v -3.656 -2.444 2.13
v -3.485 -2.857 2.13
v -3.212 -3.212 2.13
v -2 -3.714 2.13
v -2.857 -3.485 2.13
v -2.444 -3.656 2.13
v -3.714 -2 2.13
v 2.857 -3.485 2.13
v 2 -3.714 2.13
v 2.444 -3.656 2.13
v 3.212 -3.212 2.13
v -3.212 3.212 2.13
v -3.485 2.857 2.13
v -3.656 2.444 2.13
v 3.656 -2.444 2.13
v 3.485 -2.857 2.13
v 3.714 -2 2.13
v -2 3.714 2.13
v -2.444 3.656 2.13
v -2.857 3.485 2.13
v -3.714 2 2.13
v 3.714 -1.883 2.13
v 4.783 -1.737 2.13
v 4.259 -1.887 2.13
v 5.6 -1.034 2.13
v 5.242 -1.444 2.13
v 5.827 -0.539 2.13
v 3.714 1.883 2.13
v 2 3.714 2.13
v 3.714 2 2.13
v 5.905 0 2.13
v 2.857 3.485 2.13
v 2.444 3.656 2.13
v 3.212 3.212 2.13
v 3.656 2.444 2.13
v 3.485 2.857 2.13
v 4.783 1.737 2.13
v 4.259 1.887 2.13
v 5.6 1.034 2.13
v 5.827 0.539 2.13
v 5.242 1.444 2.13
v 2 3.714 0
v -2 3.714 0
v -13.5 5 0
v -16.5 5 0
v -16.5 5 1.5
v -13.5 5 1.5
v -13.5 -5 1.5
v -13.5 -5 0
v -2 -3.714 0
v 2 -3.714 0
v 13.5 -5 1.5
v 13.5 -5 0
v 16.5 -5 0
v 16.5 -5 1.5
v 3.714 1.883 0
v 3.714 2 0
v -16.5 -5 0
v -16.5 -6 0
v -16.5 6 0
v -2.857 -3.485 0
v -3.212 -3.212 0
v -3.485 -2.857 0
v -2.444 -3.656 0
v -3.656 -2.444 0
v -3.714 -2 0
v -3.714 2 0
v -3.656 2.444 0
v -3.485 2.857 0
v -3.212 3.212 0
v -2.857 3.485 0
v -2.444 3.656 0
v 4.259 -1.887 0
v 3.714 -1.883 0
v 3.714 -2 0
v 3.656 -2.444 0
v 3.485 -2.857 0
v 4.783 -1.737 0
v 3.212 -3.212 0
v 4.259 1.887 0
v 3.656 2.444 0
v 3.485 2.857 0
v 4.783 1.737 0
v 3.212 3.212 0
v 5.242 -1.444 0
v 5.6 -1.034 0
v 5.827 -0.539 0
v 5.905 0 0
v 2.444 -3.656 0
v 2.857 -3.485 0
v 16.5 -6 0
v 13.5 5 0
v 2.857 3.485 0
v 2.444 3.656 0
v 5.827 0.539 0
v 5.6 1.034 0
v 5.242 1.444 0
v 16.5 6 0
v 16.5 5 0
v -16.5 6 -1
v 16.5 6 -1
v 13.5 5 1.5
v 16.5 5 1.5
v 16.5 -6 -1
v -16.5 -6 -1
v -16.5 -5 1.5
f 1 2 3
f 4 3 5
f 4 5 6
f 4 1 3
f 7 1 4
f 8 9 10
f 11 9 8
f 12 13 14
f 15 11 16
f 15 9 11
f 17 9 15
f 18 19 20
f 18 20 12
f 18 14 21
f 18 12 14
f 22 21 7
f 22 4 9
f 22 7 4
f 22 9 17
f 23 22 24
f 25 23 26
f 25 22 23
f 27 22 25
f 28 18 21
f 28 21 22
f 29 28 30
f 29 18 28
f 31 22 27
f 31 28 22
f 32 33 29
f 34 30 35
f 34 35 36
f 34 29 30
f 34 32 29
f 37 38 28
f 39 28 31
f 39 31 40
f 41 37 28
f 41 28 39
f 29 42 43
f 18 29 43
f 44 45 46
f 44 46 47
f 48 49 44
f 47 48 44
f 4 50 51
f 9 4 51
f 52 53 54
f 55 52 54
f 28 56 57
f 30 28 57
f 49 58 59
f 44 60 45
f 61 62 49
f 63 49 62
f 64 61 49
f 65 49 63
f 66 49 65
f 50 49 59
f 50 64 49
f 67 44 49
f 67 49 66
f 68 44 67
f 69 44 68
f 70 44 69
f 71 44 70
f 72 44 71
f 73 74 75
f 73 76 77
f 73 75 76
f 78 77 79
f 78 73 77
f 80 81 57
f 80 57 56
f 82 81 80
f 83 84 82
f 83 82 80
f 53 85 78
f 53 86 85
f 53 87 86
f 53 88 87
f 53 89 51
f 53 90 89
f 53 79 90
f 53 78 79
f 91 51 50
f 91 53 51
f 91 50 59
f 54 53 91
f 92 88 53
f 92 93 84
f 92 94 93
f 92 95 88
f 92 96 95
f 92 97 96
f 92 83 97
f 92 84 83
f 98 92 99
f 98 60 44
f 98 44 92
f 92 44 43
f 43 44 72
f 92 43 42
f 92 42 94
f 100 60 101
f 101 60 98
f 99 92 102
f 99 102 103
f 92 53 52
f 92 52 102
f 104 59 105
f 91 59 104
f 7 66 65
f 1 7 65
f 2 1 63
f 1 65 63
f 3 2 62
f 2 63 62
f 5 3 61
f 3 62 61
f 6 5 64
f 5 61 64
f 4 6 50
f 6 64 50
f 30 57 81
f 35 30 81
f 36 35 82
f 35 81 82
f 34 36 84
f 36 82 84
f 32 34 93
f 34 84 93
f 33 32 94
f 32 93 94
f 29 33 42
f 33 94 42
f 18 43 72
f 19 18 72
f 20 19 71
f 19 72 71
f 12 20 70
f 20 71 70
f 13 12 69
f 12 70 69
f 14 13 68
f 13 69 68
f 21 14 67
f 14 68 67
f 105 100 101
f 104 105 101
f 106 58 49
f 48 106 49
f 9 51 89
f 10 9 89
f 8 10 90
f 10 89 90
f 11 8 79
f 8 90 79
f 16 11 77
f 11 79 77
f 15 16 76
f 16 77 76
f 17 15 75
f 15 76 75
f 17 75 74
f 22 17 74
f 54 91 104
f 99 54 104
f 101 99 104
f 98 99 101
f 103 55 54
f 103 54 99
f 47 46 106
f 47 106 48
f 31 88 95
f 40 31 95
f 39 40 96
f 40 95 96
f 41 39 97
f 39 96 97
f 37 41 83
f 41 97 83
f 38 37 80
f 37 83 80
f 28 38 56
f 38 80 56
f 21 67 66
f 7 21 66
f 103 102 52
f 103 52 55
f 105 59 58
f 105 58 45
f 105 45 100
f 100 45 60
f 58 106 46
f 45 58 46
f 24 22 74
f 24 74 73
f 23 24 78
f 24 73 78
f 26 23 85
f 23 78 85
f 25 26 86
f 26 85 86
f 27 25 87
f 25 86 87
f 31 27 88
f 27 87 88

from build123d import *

# Parameters (mm, degrees)
F2_W      = 5
F2_H      = 5
F4_DEPTH  = 2.13
F5_DEPTH  = 2.13
F6_W      = 33
F6_H      = 12
F7_DEPTH  = 1
F9_DEPTH  = 2.13
F10_W     = 3
F10_H     = 10
F11_DEPTH = 1.5


with BuildPart() as f4:
    # F2 (on Top) → F4 (new body)
    with BuildSketch(Plane.XY):
        Rectangle(F2_W, F2_H)
    extrude(amount=F4_DEPTH)



with BuildPart() as f5:
    # F3 (on face) → F5 (new body)
    with BuildSketch(Plane.XY):
        with BuildLine():
            ThreePointArc((5.905, 0), (4.6210978184, 1.800906022), (2.5, 1.1743189516))
            Line((2.5, 1.1743189516), (2.5, -1.1743189516))
            ThreePointArc((2.5, -1.1743189516), (4.6210978184, -1.800906022), (5.905, 0))
        make_face()
    extrude(amount=F5_DEPTH)


with BuildPart() as f7:
    # F6 (on face) → F7 (new body)
    with BuildSketch(Plane.XY):
        Rectangle(F6_W, F6_H)
    extrude(amount=-F7_DEPTH)


with BuildPart() as f4_1:
    add(f4.part)

    add(f5.part)  # F9 merges F5

    add(f7.part)  # F9 merges F7
    # F8 (on face) → F9 (join, through all)
    with BuildSketch(Plane.XY):
        with BuildLine():
            Line((2, 3.7145), (-2, 3.7145))
            ThreePointArc((-2, 3.7145), (-3.2123345763, 3.2123345763), (-3.7145, 2))
            Line((-3.7145, 2), (-3.7145, -2))
            ThreePointArc((-3.7145, -2), (-3.2123345763, -3.2123345763), (-2, -3.7145))
            Line((-2, -3.7145), (2, -3.7145))
            ThreePointArc((2, -3.7145), (3.2123345763, -3.2123345763), (3.7145, -2))
            Line((3.7145, -2), (3.7145, 2))
            ThreePointArc((3.7145, 2), (3.2123345763, 3.2123345763), (2, 3.7145))
        make_face()
    extrude(amount=F9_DEPTH)

    # F10 (on face) → F11 (join)
    with BuildSketch(Plane.XY):
        with Locations((-15, 0)):
            Rectangle(F10_W, F10_H)
        with Locations((15, 0)):
            Rectangle(F10_W, F10_H)
    extrude(amount=F11_DEPTH)


solid = f4_1.part
